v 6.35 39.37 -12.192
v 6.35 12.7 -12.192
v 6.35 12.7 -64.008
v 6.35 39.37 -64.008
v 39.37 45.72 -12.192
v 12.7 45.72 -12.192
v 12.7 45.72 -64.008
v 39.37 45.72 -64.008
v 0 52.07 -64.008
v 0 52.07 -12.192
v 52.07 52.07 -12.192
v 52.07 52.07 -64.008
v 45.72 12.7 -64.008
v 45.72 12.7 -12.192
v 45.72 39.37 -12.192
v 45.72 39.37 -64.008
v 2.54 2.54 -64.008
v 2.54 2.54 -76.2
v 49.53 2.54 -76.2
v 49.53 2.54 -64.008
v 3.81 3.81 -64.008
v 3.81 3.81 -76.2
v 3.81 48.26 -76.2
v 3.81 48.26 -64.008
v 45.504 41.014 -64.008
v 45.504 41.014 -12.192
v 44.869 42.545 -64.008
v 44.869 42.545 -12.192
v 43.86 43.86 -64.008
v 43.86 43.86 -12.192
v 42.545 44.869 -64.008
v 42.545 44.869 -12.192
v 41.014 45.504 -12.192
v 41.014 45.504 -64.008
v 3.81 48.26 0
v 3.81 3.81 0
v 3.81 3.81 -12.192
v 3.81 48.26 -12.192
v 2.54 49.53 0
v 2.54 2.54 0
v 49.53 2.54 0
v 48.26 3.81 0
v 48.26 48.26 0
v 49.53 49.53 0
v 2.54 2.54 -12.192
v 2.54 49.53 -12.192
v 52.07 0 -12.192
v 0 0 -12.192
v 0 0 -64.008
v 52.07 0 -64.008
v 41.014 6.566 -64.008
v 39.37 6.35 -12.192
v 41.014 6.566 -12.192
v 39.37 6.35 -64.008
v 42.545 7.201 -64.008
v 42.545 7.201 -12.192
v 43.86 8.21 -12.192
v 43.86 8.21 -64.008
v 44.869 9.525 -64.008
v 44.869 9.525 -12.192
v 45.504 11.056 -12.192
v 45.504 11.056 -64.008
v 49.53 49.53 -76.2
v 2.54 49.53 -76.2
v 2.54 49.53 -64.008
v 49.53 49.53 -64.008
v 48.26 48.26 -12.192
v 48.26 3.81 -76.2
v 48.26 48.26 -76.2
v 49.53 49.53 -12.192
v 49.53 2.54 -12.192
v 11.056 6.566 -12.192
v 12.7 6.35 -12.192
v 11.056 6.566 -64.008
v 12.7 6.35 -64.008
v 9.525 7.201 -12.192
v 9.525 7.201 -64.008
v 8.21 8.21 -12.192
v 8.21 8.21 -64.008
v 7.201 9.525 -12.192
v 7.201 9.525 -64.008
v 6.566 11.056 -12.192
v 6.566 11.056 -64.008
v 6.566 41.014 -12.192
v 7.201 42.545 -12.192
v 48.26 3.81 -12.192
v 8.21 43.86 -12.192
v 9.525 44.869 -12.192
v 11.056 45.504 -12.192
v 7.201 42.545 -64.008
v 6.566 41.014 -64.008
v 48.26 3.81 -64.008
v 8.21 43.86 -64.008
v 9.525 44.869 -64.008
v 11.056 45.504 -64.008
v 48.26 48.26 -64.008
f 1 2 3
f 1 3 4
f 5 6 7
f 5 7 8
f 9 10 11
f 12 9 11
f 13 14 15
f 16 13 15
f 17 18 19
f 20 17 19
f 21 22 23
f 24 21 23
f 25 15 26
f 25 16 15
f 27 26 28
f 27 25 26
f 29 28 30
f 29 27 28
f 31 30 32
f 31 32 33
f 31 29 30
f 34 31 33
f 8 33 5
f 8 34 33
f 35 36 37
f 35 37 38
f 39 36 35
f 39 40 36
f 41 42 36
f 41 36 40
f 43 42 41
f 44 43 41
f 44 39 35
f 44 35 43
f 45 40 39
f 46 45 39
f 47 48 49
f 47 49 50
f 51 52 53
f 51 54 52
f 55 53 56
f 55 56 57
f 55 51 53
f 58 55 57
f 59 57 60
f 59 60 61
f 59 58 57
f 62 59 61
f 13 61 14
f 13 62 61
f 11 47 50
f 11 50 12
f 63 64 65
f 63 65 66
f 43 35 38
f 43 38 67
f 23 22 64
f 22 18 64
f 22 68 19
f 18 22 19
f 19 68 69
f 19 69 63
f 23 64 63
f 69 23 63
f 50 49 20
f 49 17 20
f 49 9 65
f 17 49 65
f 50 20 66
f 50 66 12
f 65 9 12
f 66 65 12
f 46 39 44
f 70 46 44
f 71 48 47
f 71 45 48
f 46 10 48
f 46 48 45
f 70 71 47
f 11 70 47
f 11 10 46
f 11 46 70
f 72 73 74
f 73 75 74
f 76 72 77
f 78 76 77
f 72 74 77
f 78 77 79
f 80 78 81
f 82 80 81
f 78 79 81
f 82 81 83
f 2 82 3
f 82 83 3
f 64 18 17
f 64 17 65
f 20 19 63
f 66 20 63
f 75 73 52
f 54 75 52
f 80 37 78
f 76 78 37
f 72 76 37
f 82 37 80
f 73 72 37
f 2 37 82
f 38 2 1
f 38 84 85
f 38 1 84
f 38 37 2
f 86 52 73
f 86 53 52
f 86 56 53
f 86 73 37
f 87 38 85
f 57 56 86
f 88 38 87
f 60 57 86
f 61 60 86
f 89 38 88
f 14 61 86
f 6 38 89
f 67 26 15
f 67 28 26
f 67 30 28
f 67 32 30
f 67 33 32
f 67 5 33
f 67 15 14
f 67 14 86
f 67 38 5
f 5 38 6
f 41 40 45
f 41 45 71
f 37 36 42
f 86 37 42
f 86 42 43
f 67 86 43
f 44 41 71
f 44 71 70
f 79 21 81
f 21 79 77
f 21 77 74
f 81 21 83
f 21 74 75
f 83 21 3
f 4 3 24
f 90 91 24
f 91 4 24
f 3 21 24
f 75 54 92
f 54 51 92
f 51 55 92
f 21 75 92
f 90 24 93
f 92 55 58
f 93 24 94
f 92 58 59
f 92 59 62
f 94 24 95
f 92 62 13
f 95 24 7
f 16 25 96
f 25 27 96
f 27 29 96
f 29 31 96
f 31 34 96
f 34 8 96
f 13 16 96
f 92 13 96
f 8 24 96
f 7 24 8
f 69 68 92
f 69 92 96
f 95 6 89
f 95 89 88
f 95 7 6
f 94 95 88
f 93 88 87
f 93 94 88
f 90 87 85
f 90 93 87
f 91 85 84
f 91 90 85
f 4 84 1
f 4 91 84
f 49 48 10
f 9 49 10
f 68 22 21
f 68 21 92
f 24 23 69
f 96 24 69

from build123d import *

# Parameters (mm, degrees)
SKETCH1_W           = 52.07
SKETCH1_H           = 52.07
BOSS_EXTRUDE1_DEPTH = 76.2
SKETCH2_W           = 39.37
SKETCH2_H           = 39.37
CUT_EXTRUDE1_DEPTH  = 106.967022229
SKETCH3_W           = 52.07
SKETCH3_H           = 52.07
SKETCH3_W_2         = 46.99
SKETCH3_H_2         = 46.99
SKETCH3_W_3         = 44.45
SKETCH3_H_3         = 44.45
SKETCH3_W_4         = 39.37
SKETCH3_H_4         = 39.37
CUT_EXTRUDE2_DEPTH  = 12.192
FILLET1_R           = 6.35


with BuildPart() as part:
    # Sketch1 → Boss-Extrude1 (new body)
    with BuildSketch(Plane.XY):
        with Locations((26.035, 26.035)):
            Rectangle(SKETCH1_W, SKETCH1_H)
    extrude(amount=-BOSS_EXTRUDE1_DEPTH)

    # Sketch2 → Cut-Extrude1 (cut, through all)
    with BuildSketch(Plane.XY):
        with Locations((26.035, 26.035)):
            Rectangle(SKETCH2_W, SKETCH2_H)
    extrude(amount=-CUT_EXTRUDE1_DEPTH, mode=Mode.SUBTRACT)

    # Sketch3 → Cut-Extrude2 (cut)
    # profile 1 of 2: a face of its own
    with BuildSketch(Plane.XY):
        with Locations((26.035, 26.035)):
            Rectangle(SKETCH3_W, SKETCH3_H)
        with Locations((26.035, 26.035)):
            Rectangle(SKETCH3_W_2, SKETCH3_H_2, mode=Mode.SUBTRACT)
    # profile 2 of 2: a face of its own
    with BuildSketch(Plane.XY):
        with Locations((26.035, 26.035)):
            Rectangle(SKETCH3_W_3, SKETCH3_H_3)
        with Locations((26.035, 26.035)):
            Rectangle(SKETCH3_W_4, SKETCH3_H_4, mode=Mode.SUBTRACT)
    cut_extrude2 = extrude(amount=-CUT_EXTRUDE2_DEPTH, mode=Mode.SUBTRACT)

    # Mirror1: Cut-Extrude2 across plane
    add(cut_extrude2.mirror(Plane(origin=(0, 0, -38.1), x_dir=(1, 0, 0), z_dir=(0, 0, -1))), mode=Mode.SUBTRACT)

    # Fillet1
    fillet1_edges = [part.edges().sort_by_distance(p)[0] for p in [
        (45.72, 6.35, -38.1),
        (6.35, 6.35, -38.1),
        (45.72, 45.72, -38.1),
        (6.35, 45.72, -38.1),
    ]]
    fillet(fillet1_edges, radius=FILLET1_R)


solid = part.part
